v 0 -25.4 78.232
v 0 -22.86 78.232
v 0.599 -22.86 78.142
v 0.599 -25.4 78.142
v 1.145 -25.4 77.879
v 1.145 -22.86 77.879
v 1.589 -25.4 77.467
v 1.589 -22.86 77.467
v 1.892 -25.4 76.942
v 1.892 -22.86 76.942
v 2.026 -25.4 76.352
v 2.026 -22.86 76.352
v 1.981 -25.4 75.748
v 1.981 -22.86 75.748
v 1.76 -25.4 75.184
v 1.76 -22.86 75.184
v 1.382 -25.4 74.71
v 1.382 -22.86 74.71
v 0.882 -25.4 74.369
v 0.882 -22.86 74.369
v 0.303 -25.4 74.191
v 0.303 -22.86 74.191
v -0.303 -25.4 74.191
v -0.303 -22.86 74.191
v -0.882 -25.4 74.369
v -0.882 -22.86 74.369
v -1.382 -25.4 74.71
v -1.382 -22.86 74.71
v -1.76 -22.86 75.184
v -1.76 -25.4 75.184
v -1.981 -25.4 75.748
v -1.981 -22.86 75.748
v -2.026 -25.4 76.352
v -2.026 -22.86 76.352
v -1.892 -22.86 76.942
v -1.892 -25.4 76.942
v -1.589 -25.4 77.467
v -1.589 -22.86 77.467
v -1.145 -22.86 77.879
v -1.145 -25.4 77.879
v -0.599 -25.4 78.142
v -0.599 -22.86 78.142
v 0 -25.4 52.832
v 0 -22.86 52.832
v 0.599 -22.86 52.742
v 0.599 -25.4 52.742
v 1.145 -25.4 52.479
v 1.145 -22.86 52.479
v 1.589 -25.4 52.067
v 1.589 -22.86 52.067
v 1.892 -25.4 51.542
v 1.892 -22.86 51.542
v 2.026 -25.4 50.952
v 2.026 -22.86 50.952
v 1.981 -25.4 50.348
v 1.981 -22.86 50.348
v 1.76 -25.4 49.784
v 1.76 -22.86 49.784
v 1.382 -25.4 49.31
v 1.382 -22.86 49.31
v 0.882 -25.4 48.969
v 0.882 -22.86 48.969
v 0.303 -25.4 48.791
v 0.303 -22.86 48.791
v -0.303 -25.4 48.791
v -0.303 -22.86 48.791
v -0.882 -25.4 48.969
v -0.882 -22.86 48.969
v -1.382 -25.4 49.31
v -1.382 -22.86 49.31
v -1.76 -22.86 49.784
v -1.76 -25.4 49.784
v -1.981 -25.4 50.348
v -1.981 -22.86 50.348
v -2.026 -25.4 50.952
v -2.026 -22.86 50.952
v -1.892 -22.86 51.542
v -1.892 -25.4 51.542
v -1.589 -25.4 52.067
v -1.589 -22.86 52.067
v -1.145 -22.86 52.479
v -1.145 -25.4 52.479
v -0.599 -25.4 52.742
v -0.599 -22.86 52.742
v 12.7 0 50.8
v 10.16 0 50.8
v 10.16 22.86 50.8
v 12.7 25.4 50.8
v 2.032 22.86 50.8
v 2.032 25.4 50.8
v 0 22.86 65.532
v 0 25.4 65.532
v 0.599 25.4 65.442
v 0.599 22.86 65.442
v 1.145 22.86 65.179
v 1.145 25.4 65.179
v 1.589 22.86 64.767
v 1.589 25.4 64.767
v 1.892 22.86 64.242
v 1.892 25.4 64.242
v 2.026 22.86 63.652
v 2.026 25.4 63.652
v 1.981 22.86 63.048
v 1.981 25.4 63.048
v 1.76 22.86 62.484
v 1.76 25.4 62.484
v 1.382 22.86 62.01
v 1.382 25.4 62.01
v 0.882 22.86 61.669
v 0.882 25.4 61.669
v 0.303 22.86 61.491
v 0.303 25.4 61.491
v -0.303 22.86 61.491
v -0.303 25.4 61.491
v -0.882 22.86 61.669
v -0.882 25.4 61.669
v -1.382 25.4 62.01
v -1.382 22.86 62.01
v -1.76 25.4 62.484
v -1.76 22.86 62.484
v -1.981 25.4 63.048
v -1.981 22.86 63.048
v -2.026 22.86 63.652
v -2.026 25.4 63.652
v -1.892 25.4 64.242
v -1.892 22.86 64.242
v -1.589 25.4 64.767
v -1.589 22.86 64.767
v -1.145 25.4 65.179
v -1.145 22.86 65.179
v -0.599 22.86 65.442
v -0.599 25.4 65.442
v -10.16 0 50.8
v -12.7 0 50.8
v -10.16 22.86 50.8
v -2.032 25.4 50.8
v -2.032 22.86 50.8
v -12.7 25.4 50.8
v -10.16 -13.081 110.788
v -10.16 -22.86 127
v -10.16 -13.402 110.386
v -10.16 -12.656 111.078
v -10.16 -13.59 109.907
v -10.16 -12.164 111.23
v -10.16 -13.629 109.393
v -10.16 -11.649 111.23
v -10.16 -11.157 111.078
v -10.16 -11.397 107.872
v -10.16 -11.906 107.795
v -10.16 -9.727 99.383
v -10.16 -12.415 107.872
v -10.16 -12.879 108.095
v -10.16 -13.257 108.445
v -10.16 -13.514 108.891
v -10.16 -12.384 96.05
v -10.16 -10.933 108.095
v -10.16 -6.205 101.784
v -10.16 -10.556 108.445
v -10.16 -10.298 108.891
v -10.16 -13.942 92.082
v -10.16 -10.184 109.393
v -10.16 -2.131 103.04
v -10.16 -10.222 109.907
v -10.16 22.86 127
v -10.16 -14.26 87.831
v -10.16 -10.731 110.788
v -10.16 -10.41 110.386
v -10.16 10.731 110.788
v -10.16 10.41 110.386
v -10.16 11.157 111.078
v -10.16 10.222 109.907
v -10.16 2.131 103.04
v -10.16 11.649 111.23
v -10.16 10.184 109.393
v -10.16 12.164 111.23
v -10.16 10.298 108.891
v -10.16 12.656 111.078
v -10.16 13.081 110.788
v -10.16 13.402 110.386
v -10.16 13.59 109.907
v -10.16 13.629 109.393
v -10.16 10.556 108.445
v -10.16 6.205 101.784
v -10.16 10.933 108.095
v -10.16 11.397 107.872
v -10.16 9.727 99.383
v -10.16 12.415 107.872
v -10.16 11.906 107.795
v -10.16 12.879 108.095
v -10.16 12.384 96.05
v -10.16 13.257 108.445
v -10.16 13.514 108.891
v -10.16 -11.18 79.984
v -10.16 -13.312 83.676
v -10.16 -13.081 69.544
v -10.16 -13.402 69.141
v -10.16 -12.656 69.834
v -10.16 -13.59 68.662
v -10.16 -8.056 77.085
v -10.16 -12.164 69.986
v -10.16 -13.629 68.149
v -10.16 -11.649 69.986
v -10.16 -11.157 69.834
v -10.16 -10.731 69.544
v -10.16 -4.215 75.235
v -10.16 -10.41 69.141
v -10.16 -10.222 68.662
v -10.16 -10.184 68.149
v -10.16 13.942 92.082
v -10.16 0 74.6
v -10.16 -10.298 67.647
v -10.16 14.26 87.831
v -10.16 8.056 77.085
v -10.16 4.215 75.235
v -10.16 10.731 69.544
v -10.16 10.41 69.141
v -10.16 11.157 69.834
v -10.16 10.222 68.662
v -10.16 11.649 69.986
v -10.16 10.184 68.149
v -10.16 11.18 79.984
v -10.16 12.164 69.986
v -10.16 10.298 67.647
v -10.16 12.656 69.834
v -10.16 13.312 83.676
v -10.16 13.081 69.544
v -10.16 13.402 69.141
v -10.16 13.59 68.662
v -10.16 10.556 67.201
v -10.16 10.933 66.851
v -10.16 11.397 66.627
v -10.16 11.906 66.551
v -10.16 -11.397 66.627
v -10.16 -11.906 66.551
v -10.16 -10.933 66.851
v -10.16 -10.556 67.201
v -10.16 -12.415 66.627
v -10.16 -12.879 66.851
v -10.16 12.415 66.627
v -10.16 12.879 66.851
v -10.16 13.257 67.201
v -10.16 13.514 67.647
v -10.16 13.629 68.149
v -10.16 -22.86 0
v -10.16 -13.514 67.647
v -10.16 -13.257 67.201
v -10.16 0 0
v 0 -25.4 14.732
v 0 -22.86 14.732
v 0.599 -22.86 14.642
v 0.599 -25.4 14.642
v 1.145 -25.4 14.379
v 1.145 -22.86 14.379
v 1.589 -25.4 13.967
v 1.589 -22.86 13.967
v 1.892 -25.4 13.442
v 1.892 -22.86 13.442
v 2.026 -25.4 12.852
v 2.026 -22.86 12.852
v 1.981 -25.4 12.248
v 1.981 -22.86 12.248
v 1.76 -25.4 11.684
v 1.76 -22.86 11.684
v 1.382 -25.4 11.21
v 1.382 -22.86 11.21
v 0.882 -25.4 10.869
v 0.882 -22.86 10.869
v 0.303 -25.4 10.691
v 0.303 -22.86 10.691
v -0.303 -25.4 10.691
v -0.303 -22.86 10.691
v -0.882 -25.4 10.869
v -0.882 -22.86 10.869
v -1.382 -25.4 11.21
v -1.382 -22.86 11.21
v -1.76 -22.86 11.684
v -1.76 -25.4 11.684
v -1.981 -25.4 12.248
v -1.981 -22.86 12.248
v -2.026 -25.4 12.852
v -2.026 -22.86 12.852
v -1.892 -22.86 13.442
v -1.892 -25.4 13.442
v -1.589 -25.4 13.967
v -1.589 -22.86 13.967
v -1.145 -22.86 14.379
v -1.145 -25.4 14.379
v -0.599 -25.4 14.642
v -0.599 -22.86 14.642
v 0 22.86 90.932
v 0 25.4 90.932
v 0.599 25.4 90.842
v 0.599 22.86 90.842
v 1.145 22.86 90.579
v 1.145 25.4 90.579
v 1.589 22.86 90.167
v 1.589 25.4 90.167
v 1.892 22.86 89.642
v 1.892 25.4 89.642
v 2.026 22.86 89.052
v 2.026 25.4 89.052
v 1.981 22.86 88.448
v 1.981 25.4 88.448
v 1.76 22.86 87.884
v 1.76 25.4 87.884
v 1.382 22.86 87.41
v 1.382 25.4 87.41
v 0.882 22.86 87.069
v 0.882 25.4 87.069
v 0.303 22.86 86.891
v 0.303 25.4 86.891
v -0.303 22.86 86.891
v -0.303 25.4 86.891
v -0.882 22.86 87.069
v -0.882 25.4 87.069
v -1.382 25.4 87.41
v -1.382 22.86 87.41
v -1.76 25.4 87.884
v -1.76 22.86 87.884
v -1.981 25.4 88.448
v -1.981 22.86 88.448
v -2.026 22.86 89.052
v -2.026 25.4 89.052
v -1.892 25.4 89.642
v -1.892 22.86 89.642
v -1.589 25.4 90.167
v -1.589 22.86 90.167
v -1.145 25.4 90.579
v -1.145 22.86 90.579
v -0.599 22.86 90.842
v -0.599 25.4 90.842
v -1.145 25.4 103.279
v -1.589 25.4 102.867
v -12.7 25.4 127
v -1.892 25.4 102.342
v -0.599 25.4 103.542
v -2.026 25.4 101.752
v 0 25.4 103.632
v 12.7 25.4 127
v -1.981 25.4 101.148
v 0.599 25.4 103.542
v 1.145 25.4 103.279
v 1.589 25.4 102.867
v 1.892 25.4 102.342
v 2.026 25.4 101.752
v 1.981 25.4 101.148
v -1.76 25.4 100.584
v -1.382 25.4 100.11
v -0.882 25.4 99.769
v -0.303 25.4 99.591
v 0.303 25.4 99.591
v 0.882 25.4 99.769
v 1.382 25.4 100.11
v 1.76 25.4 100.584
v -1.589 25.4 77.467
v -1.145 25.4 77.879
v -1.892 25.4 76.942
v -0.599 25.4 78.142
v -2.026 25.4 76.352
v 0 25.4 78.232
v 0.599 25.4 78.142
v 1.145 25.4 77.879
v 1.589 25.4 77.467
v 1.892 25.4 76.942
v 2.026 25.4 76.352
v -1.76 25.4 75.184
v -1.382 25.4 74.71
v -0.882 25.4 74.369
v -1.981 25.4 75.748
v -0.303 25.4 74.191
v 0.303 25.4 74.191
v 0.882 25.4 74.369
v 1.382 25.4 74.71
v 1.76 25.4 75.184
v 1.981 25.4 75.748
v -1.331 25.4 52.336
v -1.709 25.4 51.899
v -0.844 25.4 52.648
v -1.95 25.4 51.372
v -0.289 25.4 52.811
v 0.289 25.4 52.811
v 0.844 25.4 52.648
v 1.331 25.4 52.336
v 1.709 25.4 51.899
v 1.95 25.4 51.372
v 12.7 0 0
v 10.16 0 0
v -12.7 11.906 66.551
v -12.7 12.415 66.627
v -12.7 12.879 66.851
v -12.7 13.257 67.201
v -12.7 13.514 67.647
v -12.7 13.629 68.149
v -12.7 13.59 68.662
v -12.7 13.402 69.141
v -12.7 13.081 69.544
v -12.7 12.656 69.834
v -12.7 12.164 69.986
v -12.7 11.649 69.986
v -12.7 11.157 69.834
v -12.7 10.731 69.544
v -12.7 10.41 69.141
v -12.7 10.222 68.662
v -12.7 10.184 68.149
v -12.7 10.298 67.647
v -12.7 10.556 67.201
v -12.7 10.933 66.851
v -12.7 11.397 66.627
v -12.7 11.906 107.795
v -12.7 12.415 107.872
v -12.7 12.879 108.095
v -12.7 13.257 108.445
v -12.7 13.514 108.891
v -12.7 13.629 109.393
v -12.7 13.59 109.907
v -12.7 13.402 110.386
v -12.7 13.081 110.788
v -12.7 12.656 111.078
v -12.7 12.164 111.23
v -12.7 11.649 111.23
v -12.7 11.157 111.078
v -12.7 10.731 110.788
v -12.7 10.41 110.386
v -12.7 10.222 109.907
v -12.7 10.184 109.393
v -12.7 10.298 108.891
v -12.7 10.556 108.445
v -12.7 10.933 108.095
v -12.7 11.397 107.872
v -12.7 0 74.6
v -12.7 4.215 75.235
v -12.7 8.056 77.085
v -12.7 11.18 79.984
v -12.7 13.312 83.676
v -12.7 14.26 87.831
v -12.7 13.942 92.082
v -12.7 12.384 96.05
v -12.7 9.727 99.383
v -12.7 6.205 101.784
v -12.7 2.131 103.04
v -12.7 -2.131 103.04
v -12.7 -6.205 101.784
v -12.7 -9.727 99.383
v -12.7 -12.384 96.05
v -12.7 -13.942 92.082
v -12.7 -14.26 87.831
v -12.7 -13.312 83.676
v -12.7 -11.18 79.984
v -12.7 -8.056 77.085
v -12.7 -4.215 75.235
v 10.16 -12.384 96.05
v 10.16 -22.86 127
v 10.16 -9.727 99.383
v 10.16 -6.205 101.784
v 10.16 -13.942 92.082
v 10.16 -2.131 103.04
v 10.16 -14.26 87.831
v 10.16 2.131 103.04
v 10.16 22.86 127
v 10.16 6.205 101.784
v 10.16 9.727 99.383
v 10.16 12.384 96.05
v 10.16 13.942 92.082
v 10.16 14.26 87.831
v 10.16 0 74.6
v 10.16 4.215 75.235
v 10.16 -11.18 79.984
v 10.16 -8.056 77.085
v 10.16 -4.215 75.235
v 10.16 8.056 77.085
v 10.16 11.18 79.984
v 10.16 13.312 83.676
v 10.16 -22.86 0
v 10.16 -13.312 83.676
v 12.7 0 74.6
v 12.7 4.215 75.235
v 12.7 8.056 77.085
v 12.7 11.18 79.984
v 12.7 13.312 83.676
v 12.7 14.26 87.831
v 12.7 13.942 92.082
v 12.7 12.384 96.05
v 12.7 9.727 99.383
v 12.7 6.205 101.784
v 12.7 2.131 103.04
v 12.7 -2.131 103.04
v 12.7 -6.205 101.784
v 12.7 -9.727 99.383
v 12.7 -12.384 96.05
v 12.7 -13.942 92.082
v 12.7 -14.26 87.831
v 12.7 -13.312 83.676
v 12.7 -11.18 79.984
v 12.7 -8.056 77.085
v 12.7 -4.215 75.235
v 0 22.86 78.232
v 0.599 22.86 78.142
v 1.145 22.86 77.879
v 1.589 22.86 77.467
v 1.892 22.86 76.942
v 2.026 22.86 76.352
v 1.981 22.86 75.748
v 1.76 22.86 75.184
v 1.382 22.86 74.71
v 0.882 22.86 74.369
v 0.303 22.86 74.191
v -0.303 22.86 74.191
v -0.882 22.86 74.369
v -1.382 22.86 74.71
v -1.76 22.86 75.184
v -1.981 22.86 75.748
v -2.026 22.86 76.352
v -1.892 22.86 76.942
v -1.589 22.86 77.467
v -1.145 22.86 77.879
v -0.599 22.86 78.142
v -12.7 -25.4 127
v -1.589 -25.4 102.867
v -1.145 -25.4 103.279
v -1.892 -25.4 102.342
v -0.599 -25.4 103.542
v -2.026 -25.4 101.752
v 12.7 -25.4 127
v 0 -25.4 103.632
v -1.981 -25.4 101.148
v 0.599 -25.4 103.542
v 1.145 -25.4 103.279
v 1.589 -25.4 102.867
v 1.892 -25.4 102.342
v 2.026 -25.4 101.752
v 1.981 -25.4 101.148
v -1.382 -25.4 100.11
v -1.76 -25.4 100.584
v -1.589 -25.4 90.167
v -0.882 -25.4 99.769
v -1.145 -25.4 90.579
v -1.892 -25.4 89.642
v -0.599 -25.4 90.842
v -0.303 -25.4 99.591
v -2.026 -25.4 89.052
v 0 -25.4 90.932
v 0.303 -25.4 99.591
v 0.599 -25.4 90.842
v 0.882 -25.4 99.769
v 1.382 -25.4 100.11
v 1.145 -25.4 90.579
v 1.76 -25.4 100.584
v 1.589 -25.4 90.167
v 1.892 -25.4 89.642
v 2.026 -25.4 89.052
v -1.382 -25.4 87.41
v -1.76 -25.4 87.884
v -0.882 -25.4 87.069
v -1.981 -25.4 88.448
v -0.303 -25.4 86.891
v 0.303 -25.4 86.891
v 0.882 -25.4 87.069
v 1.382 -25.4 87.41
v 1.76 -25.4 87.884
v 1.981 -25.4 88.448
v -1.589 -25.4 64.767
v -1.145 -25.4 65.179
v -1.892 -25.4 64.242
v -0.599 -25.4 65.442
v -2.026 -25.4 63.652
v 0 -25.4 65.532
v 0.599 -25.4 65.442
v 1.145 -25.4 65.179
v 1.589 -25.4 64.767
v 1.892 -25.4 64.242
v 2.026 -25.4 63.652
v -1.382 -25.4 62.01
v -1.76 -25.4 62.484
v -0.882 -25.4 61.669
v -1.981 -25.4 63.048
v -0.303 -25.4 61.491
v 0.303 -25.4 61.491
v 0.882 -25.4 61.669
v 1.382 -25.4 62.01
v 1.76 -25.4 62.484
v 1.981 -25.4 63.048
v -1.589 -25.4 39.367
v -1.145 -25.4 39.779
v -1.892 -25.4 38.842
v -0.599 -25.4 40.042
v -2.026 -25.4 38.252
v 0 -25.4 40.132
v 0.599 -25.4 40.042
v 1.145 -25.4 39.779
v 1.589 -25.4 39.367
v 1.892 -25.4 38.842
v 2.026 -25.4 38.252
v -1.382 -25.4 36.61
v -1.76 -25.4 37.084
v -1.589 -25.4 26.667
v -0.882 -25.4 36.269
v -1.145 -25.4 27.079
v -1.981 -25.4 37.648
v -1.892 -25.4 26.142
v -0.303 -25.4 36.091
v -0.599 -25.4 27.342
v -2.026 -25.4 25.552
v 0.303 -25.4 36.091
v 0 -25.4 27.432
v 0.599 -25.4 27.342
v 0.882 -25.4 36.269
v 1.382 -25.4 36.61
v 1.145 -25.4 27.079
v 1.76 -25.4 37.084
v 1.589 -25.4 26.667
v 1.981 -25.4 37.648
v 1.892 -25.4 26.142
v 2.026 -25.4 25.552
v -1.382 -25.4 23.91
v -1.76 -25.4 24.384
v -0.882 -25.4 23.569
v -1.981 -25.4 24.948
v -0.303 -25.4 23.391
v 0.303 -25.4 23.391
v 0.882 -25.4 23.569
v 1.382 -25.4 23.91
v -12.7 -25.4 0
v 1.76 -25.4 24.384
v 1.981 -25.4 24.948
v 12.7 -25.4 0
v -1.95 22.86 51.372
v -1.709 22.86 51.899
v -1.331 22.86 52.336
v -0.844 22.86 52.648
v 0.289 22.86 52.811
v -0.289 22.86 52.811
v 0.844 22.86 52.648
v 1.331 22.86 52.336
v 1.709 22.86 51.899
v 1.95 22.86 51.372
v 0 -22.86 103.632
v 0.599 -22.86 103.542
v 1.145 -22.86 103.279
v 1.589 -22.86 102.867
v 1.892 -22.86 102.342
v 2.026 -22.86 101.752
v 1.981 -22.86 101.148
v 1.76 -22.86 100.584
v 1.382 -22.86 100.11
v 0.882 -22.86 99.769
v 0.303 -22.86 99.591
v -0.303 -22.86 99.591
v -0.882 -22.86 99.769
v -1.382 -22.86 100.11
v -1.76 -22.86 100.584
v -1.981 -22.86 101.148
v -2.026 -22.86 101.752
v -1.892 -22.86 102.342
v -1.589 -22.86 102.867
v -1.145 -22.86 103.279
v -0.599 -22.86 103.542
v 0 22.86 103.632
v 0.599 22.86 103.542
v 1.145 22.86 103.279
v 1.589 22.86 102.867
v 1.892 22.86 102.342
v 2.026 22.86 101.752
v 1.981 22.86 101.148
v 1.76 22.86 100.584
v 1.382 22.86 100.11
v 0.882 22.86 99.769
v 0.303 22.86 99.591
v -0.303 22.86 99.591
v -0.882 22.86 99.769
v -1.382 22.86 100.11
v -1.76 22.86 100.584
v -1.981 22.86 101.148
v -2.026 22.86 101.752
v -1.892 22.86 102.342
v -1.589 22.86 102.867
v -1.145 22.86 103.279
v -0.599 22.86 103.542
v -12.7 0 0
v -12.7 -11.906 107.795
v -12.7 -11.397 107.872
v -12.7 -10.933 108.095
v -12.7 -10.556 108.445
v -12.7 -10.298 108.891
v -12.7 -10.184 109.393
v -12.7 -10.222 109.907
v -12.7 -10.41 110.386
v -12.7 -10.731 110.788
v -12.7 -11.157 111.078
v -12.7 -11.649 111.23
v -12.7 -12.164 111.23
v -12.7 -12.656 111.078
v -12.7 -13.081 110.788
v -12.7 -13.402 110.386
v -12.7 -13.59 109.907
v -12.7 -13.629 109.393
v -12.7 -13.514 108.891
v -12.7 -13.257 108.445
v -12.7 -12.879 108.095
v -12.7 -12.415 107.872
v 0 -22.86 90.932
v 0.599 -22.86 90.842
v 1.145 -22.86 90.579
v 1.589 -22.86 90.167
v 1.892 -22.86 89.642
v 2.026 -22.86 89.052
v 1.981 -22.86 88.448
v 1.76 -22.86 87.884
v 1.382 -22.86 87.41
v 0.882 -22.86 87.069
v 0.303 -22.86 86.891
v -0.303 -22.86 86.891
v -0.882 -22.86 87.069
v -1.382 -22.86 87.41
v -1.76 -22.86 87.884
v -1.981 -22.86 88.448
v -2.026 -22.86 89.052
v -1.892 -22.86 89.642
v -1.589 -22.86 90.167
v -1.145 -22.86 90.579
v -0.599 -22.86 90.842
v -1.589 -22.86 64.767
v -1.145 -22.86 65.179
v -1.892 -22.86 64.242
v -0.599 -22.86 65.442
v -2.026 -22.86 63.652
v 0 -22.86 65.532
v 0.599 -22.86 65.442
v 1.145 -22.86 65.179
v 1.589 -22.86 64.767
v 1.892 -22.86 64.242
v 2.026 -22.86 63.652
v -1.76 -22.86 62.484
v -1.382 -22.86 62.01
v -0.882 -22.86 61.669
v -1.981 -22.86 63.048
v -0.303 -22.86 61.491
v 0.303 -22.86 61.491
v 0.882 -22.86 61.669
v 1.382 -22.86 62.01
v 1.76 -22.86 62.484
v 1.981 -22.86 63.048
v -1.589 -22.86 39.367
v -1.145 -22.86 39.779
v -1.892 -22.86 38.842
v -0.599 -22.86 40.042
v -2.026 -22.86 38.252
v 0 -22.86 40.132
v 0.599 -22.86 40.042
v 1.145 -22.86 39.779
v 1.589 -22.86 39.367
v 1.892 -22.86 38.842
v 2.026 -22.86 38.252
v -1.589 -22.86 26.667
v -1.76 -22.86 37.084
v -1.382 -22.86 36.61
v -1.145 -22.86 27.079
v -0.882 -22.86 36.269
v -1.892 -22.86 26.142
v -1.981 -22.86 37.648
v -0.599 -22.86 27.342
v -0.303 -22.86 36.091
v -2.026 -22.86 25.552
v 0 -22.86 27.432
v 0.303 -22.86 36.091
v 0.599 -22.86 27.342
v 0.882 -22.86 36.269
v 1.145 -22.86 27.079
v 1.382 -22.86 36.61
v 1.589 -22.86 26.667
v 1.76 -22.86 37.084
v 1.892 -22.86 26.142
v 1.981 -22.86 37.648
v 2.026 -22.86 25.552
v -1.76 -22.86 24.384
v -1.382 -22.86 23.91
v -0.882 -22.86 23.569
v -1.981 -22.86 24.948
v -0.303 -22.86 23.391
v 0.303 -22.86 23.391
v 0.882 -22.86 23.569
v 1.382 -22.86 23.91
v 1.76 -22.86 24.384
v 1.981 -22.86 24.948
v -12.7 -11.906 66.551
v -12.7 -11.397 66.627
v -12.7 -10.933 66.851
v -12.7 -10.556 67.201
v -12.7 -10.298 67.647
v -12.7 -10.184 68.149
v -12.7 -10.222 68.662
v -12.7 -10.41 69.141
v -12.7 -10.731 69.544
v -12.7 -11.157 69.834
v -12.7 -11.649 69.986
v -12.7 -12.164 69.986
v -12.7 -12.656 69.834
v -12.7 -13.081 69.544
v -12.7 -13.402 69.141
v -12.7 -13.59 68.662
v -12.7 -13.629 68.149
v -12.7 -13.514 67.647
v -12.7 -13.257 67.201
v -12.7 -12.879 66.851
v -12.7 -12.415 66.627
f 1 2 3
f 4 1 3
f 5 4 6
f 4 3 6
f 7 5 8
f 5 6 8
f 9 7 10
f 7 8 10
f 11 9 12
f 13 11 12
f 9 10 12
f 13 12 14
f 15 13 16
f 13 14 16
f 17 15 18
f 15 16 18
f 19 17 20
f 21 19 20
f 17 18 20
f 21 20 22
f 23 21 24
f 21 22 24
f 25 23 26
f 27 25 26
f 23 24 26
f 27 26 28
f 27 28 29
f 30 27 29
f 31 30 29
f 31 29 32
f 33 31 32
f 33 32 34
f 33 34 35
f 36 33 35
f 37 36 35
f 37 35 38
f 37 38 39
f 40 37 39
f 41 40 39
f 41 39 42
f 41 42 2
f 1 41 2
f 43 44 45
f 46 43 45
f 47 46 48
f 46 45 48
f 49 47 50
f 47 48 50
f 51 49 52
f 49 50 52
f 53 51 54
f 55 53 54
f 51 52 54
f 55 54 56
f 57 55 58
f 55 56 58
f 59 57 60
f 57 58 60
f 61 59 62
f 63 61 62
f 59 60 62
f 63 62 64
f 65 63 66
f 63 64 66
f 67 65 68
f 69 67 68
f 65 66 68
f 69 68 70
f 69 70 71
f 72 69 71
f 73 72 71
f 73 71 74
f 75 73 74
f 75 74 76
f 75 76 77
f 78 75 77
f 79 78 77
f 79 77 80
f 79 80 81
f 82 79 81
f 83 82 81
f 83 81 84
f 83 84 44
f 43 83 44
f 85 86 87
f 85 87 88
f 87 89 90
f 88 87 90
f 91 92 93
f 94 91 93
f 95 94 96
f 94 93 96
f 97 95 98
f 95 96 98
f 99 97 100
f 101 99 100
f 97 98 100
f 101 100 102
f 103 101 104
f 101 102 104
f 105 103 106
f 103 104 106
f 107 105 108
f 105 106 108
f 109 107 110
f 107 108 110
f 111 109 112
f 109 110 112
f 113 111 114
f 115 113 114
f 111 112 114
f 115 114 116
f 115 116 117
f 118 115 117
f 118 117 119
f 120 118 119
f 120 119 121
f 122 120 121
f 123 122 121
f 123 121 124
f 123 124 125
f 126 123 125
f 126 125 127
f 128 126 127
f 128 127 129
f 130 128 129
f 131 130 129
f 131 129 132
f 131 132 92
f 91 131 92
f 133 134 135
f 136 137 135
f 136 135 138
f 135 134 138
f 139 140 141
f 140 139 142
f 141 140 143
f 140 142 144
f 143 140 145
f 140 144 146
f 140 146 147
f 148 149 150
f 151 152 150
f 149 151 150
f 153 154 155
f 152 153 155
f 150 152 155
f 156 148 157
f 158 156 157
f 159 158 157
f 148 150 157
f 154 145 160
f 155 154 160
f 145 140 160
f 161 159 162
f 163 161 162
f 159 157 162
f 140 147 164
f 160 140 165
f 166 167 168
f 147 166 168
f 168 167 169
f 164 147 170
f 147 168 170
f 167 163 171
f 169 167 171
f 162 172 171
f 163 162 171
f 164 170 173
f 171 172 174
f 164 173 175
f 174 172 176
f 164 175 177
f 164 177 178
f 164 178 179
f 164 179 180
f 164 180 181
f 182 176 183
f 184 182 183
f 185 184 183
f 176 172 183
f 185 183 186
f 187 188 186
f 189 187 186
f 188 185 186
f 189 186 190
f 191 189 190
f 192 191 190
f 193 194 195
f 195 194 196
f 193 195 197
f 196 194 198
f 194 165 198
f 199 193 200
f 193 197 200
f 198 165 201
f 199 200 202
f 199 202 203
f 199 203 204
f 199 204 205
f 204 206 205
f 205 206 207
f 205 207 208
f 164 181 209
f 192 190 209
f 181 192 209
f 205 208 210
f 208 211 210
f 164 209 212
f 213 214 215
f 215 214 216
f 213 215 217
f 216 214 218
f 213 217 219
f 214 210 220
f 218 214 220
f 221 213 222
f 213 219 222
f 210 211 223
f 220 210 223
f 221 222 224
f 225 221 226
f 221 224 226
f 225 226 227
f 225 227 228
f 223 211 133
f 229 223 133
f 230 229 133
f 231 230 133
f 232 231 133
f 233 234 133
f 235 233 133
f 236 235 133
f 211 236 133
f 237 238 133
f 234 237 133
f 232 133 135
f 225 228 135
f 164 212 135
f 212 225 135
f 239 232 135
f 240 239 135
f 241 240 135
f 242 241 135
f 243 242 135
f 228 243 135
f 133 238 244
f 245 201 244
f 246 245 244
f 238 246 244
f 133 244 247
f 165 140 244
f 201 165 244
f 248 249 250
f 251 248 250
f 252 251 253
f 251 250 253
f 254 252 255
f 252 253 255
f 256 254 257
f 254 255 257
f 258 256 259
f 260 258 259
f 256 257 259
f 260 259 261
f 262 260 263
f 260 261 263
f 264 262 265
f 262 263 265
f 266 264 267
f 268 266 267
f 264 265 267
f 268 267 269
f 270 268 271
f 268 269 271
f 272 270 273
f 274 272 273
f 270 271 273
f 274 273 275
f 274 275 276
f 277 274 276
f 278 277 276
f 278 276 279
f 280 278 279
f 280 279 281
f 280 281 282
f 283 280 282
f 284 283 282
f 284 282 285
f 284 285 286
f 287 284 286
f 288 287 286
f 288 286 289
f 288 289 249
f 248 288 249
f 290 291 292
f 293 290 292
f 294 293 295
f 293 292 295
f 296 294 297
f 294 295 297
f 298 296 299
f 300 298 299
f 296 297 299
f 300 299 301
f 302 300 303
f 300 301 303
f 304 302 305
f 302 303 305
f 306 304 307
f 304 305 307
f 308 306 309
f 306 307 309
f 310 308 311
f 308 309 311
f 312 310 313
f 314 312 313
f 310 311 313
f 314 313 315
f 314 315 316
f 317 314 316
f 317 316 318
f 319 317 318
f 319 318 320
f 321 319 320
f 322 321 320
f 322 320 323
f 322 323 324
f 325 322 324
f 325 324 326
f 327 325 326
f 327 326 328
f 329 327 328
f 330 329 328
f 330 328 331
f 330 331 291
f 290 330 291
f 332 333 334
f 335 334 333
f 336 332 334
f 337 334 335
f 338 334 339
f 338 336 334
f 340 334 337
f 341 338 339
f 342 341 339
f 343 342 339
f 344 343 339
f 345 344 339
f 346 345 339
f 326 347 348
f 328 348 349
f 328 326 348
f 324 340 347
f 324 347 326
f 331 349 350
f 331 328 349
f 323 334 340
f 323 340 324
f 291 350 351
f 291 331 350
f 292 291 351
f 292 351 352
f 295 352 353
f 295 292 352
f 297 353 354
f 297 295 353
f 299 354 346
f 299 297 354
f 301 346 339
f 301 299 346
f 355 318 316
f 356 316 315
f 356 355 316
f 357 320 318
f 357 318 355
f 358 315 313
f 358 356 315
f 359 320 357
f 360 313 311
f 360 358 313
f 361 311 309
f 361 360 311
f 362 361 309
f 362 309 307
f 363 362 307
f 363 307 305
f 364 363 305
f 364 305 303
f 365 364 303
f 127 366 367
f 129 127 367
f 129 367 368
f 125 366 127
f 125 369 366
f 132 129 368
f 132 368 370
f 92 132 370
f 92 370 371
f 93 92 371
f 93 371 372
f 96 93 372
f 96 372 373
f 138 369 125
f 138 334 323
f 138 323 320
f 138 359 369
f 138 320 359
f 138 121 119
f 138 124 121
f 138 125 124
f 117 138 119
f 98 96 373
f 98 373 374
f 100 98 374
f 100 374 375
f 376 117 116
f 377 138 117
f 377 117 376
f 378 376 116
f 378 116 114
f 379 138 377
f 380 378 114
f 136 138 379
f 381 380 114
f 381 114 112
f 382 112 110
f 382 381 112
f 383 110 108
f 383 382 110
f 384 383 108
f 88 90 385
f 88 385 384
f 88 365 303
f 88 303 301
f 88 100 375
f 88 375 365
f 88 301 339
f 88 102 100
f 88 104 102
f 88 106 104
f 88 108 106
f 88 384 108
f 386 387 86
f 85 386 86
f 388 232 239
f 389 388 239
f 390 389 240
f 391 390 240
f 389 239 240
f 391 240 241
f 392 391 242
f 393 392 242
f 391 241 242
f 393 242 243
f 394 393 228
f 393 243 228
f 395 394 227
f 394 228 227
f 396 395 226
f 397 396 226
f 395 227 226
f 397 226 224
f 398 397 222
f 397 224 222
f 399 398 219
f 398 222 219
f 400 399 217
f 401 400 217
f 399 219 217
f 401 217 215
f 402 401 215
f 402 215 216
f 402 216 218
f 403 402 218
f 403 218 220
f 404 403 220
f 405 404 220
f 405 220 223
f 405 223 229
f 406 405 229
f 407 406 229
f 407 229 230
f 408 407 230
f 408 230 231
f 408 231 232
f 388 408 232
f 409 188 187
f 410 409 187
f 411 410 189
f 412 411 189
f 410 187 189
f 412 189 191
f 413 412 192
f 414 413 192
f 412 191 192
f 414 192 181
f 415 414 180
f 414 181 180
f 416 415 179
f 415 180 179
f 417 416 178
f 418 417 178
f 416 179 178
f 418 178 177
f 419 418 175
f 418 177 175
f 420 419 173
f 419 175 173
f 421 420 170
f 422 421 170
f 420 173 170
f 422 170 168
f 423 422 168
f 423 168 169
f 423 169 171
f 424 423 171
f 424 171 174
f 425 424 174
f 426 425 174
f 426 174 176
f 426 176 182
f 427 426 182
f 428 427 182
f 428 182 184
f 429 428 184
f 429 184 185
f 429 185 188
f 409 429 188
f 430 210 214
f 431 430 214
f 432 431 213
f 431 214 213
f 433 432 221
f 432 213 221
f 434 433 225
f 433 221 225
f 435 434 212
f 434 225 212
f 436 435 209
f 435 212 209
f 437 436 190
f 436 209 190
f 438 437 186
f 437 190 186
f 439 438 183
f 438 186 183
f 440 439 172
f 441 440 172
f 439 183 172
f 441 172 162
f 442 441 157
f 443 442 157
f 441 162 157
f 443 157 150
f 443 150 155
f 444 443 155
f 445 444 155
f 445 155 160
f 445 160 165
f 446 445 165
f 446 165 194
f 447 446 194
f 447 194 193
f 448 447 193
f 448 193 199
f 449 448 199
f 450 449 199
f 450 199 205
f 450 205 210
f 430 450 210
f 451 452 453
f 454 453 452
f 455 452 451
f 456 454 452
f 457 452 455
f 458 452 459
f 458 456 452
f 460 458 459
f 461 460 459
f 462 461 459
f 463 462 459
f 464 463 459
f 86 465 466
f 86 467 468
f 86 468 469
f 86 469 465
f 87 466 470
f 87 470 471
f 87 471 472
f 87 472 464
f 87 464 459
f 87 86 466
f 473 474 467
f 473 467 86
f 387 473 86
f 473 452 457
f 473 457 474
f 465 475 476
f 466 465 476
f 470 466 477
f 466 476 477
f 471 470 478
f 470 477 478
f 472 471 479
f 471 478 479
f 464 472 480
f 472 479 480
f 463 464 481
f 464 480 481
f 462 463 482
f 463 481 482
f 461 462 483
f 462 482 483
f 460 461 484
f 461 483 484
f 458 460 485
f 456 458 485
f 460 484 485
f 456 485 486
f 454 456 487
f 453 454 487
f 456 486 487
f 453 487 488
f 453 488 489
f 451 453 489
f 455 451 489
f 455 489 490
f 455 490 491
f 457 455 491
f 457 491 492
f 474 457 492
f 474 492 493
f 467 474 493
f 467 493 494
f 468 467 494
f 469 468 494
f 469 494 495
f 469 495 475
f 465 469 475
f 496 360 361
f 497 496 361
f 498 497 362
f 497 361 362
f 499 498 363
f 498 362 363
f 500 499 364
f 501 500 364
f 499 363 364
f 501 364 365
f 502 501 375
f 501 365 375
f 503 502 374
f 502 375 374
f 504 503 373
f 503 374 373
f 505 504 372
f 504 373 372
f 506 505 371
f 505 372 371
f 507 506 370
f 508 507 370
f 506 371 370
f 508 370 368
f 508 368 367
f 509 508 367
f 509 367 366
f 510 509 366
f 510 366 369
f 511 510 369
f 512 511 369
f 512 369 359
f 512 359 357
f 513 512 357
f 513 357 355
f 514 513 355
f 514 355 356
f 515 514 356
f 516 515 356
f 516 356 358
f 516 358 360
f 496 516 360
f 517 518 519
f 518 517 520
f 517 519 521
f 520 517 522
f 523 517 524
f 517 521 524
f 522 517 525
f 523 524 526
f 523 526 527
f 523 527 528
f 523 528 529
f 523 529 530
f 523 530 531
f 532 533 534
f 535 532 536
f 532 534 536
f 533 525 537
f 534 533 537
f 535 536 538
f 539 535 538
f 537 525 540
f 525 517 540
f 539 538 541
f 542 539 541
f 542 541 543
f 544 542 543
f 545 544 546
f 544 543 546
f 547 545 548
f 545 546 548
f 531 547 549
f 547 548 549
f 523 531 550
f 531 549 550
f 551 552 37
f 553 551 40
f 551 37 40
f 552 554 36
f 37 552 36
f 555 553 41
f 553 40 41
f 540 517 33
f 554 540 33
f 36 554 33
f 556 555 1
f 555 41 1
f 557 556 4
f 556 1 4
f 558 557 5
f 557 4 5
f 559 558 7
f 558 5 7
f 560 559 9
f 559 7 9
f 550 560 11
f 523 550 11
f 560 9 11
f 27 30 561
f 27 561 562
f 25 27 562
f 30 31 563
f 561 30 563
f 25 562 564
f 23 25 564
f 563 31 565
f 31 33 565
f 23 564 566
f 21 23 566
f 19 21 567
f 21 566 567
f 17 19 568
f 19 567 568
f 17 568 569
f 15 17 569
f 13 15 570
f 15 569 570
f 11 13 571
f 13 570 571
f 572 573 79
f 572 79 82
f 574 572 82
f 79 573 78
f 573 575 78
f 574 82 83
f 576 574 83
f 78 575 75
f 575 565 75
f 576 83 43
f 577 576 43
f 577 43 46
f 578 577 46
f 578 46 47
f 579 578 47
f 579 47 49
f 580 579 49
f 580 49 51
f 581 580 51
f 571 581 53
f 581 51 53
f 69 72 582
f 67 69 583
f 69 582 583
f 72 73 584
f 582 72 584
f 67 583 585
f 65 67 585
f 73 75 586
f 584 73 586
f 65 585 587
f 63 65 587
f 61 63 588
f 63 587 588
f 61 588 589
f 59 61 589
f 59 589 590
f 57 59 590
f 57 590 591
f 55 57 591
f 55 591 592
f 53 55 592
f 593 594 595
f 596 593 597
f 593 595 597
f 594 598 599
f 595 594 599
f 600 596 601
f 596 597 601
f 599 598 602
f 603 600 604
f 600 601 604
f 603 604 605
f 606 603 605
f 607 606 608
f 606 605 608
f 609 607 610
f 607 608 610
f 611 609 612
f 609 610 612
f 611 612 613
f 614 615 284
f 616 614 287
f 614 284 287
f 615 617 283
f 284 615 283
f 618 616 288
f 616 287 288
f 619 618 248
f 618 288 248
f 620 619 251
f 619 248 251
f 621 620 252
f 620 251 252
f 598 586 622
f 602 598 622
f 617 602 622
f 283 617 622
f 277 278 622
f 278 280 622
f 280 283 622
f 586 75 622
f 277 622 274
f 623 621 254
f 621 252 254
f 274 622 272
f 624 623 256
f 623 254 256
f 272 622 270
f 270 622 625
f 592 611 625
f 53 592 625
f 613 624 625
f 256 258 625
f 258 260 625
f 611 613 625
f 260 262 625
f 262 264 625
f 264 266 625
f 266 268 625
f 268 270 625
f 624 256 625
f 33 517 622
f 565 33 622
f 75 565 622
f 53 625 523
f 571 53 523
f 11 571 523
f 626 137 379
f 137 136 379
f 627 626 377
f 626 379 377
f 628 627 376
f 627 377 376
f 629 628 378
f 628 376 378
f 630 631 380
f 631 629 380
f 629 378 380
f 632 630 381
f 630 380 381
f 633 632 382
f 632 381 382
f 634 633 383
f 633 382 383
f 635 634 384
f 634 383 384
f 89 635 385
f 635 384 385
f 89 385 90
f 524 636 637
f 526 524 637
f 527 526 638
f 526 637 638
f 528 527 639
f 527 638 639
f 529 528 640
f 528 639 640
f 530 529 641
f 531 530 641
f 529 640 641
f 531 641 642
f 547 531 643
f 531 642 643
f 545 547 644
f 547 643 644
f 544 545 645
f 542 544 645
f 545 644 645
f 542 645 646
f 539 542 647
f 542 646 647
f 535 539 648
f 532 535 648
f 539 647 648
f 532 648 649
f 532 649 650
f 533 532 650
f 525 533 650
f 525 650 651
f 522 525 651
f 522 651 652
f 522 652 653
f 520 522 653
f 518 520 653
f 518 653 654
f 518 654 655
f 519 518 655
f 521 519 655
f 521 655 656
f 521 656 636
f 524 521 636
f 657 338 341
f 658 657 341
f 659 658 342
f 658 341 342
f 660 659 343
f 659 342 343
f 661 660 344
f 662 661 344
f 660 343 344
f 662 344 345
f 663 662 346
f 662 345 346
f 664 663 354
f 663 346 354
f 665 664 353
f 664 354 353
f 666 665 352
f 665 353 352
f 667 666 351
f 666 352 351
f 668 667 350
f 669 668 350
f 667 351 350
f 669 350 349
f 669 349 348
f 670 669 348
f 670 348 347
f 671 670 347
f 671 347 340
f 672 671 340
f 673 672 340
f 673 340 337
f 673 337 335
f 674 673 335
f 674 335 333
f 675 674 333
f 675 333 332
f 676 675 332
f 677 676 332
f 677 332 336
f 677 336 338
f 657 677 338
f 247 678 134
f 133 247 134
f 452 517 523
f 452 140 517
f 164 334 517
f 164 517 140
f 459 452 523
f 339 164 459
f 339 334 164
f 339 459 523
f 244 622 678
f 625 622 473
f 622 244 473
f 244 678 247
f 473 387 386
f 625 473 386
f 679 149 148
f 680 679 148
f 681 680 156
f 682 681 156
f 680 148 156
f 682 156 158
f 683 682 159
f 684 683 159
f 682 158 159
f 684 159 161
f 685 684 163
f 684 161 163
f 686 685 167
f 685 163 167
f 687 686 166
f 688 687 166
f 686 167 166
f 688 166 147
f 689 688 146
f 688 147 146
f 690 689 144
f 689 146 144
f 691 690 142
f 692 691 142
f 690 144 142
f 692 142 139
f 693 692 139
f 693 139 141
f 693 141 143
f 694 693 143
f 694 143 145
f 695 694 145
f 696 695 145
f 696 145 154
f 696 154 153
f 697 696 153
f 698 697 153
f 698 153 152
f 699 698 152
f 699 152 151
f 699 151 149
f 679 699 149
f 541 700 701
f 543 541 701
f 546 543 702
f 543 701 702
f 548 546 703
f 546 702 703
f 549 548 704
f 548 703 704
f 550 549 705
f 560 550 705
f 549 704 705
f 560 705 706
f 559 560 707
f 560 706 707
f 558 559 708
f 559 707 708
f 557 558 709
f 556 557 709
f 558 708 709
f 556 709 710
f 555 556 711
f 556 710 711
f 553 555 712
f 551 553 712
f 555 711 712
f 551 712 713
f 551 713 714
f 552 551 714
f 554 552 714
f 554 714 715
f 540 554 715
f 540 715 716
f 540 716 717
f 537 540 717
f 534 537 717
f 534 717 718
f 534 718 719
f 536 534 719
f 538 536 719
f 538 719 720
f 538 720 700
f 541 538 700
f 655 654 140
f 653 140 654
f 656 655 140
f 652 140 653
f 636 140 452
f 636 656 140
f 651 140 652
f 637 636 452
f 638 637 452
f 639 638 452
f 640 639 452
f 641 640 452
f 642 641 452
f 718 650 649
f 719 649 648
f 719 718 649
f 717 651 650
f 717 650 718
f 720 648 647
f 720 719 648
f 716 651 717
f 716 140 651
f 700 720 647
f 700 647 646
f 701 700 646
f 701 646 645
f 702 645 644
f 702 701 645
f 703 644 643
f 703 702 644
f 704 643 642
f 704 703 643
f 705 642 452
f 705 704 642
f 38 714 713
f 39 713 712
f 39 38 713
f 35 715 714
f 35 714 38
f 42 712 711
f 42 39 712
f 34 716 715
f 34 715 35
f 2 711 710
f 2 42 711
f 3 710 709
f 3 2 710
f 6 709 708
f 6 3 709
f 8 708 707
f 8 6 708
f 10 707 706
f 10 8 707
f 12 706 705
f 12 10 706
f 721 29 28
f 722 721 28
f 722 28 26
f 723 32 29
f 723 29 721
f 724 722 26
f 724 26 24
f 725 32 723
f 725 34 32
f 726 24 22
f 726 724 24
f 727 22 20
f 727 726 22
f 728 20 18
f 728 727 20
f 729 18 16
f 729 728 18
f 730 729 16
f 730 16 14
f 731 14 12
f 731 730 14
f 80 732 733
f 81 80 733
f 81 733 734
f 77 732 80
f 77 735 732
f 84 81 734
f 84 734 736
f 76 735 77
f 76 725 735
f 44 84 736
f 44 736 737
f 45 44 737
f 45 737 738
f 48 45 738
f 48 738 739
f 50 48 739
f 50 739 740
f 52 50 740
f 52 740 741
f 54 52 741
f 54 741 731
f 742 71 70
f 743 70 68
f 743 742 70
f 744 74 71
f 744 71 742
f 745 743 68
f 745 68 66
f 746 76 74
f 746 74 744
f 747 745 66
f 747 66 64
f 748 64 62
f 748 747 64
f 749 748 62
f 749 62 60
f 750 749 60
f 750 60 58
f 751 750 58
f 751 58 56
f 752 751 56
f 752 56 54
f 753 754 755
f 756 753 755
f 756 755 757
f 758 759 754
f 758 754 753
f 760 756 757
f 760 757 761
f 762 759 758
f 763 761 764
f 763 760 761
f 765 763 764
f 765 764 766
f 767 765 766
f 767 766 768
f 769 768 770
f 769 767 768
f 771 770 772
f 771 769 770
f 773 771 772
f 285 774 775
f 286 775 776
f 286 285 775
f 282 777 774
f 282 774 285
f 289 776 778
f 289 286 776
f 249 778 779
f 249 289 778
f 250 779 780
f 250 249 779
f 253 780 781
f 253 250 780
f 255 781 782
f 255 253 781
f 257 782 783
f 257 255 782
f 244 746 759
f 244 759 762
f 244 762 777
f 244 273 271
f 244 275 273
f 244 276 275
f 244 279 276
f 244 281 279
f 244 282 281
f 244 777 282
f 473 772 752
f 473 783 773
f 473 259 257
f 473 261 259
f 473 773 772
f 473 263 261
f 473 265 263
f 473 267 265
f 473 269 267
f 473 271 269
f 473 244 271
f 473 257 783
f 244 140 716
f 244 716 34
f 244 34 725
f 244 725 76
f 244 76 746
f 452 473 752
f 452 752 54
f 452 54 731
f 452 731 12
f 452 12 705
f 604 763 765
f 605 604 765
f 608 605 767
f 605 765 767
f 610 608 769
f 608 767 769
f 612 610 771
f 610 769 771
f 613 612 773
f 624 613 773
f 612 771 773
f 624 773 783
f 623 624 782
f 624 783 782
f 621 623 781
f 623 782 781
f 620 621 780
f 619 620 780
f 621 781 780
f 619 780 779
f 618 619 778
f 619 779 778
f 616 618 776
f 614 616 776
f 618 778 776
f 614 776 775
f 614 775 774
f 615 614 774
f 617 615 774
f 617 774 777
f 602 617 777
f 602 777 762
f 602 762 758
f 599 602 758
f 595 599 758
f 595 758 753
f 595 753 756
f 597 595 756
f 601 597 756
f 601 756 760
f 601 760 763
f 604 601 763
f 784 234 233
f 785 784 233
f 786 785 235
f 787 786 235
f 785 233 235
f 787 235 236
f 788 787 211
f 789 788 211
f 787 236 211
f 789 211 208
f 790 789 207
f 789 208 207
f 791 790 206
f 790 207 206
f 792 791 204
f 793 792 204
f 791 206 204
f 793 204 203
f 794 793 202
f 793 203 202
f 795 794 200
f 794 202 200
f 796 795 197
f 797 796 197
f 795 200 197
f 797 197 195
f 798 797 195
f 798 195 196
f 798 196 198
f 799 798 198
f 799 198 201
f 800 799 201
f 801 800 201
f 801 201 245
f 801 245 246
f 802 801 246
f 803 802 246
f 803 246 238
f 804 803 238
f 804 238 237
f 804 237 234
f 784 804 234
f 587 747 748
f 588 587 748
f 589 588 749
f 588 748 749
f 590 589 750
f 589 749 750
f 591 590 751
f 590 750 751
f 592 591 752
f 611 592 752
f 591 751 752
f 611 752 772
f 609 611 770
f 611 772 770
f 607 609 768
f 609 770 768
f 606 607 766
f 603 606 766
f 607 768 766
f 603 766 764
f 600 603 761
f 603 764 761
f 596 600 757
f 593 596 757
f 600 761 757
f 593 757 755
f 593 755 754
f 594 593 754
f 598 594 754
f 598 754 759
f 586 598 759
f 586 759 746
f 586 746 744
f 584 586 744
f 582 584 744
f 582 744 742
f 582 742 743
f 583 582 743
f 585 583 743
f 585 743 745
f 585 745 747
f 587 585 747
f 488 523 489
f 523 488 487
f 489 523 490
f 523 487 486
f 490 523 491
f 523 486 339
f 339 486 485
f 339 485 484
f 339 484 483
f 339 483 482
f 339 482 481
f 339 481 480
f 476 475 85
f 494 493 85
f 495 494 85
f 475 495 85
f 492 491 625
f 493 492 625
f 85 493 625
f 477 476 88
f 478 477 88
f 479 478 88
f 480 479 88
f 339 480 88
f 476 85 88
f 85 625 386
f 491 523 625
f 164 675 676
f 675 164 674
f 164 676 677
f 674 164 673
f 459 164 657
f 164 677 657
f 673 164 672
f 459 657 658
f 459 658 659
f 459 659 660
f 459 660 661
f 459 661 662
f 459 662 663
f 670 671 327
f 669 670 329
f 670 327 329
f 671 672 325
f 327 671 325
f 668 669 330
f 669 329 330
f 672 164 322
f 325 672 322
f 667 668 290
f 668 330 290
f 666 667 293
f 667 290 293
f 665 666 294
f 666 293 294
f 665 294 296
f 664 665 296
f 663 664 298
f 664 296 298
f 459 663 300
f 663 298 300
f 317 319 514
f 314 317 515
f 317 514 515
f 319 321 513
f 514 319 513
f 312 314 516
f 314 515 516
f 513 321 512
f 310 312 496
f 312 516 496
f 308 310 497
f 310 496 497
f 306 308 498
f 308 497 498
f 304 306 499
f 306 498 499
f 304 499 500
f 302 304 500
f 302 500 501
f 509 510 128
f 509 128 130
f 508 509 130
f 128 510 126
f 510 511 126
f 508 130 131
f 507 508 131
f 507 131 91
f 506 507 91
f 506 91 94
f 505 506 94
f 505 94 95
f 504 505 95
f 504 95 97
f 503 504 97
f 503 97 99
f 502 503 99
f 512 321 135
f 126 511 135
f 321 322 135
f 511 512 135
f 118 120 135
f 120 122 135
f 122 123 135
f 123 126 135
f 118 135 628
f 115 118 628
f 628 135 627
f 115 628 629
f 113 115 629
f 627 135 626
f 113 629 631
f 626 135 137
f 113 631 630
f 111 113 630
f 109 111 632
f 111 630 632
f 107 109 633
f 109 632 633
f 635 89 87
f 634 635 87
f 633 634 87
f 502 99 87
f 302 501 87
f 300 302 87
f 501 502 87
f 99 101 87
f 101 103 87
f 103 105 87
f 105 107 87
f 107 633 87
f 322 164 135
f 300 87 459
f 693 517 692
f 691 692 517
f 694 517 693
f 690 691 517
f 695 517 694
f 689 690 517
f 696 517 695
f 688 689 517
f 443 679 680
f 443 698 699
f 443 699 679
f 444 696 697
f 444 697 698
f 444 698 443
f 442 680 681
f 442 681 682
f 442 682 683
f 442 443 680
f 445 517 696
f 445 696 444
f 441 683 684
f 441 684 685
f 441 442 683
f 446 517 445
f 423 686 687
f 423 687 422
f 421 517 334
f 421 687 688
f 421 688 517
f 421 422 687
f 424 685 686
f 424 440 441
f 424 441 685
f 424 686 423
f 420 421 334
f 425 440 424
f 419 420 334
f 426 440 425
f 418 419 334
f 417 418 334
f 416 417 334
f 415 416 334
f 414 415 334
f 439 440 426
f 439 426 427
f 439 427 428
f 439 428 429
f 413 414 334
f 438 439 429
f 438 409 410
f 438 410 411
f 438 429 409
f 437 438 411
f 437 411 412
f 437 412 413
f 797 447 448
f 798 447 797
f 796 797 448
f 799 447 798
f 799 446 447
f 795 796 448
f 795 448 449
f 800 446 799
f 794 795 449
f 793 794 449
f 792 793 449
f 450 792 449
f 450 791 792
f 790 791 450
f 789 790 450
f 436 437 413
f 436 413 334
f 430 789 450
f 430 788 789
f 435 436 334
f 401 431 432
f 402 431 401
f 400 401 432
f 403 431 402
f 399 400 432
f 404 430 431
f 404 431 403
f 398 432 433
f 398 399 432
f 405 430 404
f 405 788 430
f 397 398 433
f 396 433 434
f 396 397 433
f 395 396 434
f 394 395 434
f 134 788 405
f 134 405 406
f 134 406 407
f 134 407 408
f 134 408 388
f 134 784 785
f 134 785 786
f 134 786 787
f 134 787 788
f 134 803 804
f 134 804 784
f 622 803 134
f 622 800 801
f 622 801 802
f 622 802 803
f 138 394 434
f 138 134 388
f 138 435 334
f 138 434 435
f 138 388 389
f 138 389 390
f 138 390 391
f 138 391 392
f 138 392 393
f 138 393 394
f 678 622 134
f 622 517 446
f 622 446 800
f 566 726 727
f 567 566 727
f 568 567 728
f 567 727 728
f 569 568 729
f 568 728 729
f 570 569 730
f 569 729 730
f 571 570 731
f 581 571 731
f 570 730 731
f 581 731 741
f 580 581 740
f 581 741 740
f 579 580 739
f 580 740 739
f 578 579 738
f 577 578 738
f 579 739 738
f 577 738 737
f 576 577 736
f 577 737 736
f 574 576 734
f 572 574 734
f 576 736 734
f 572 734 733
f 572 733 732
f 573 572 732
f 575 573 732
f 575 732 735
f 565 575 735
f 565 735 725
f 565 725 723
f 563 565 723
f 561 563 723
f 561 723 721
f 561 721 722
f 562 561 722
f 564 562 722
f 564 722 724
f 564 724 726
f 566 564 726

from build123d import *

# Parameters (mm, degrees)
SKETCH1_W                 = 25.4
SKETCH1_H                 = 50.8
SKETCH1_W_2               = 20.32
SKETCH1_H_2               = 45.72
BOSS_EXTRUDE1_DEPTH       = 127
SKETCH2_R                 = 2.032
CUT_EXTRUDE1_DEPTH        = 138.371503595
SKETCH3_R                 = 14.3002
CUT_EXTRUDE2_DEPTH        = 132.982271537
CUT_EXTRUDE3_REACH        = 133.982
SKETCH4_W                 = 50.8
SKETCH4_H                 = 25.4
F_8_32_TAPPED_HOLE1_D     = 3.4544
F_8_32_TAPPED_HOLE1_DEPTH = 2.54


with BuildPart() as part:
    # Sketch1 → Boss-Extrude1 (new body)
    with BuildSketch(Plane.XY):
        Rectangle(SKETCH1_W, SKETCH1_H)
        Rectangle(SKETCH1_W_2, SKETCH1_H_2, mode=Mode.SUBTRACT)
    extrude(amount=BOSS_EXTRUDE1_DEPTH)

    # Sketch2 → Cut-Extrude1 (cut, through all)
    with BuildSketch(Plane(origin=(0, 25.4, 0), x_dir=(1, 0, 0), z_dir=(0, 1, 0))):
        with Locations(Location((0, -12.7, 0), (0, 0, 270))):
            Circle(SKETCH2_R)
        with Locations(Location((0, -25.4, 0), (0, 0, 270))):
            Circle(SKETCH2_R)
        with Locations(Location((0, -38.1, 0), (0, 0, 270))):
            Circle(SKETCH2_R)
        with Locations(Location((0, -50.8, 0), (0, 0, 270))):
            Circle(SKETCH2_R)
        with Locations(Location((0, -63.5, 0), (0, 0, 270))):
            Circle(SKETCH2_R)
        with Locations(Location((0, -76.2, 0), (0, 0, 270))):
            Circle(SKETCH2_R)
        with Locations(Location((0, -88.9, 0), (0, 0, 270))):
            Circle(SKETCH2_R)
        with Locations(Location((0, -101.6, 0), (0, 0, 270))):
            Circle(SKETCH2_R)
    extrude(amount=-CUT_EXTRUDE1_DEPTH, mode=Mode.SUBTRACT)

    # Sketch3 → Cut-Extrude2 (cut, through all)
    with BuildSketch(Plane(origin=(12.7, 0, 0), x_dir=(0, 0, -1), z_dir=(1, 0, 0))):
        with Locations((-88.9, 0)):
            Circle(SKETCH3_R)
    extrude(amount=-CUT_EXTRUDE2_DEPTH, mode=Mode.SUBTRACT)

    # Sketch4 → Cut-Extrude3 (cut, up to next)
    with BuildSketch(Plane.ZY.offset(12.7), mode=Mode.PRIVATE) as cut_extrude3_sk1:
        with Locations((25.4, 12.7)):
            Rectangle(SKETCH4_W, SKETCH4_H)
    cut_extrude3_tool1 = extrude(cut_extrude3_sk1.sketch, amount=-CUT_EXTRUDE3_REACH, mode=Mode.PRIVATE) & part.part
    add(cut_extrude3_tool1.solids().sort_by_distance((-12.7, 12.7, 25.4))[0], mode=Mode.SUBTRACT)

    # #8-32 Tapped Hole1
    with Locations(Plane.ZY.offset(12.7)):
        with Locations((109.522229928, 11.90625), (109.522229928, -11.90625), (68.277770072, -11.90625), (68.277770072, 11.90625)):
            Hole(F_8_32_TAPPED_HOLE1_D / 2, depth=F_8_32_TAPPED_HOLE1_DEPTH)


solid = part.part
